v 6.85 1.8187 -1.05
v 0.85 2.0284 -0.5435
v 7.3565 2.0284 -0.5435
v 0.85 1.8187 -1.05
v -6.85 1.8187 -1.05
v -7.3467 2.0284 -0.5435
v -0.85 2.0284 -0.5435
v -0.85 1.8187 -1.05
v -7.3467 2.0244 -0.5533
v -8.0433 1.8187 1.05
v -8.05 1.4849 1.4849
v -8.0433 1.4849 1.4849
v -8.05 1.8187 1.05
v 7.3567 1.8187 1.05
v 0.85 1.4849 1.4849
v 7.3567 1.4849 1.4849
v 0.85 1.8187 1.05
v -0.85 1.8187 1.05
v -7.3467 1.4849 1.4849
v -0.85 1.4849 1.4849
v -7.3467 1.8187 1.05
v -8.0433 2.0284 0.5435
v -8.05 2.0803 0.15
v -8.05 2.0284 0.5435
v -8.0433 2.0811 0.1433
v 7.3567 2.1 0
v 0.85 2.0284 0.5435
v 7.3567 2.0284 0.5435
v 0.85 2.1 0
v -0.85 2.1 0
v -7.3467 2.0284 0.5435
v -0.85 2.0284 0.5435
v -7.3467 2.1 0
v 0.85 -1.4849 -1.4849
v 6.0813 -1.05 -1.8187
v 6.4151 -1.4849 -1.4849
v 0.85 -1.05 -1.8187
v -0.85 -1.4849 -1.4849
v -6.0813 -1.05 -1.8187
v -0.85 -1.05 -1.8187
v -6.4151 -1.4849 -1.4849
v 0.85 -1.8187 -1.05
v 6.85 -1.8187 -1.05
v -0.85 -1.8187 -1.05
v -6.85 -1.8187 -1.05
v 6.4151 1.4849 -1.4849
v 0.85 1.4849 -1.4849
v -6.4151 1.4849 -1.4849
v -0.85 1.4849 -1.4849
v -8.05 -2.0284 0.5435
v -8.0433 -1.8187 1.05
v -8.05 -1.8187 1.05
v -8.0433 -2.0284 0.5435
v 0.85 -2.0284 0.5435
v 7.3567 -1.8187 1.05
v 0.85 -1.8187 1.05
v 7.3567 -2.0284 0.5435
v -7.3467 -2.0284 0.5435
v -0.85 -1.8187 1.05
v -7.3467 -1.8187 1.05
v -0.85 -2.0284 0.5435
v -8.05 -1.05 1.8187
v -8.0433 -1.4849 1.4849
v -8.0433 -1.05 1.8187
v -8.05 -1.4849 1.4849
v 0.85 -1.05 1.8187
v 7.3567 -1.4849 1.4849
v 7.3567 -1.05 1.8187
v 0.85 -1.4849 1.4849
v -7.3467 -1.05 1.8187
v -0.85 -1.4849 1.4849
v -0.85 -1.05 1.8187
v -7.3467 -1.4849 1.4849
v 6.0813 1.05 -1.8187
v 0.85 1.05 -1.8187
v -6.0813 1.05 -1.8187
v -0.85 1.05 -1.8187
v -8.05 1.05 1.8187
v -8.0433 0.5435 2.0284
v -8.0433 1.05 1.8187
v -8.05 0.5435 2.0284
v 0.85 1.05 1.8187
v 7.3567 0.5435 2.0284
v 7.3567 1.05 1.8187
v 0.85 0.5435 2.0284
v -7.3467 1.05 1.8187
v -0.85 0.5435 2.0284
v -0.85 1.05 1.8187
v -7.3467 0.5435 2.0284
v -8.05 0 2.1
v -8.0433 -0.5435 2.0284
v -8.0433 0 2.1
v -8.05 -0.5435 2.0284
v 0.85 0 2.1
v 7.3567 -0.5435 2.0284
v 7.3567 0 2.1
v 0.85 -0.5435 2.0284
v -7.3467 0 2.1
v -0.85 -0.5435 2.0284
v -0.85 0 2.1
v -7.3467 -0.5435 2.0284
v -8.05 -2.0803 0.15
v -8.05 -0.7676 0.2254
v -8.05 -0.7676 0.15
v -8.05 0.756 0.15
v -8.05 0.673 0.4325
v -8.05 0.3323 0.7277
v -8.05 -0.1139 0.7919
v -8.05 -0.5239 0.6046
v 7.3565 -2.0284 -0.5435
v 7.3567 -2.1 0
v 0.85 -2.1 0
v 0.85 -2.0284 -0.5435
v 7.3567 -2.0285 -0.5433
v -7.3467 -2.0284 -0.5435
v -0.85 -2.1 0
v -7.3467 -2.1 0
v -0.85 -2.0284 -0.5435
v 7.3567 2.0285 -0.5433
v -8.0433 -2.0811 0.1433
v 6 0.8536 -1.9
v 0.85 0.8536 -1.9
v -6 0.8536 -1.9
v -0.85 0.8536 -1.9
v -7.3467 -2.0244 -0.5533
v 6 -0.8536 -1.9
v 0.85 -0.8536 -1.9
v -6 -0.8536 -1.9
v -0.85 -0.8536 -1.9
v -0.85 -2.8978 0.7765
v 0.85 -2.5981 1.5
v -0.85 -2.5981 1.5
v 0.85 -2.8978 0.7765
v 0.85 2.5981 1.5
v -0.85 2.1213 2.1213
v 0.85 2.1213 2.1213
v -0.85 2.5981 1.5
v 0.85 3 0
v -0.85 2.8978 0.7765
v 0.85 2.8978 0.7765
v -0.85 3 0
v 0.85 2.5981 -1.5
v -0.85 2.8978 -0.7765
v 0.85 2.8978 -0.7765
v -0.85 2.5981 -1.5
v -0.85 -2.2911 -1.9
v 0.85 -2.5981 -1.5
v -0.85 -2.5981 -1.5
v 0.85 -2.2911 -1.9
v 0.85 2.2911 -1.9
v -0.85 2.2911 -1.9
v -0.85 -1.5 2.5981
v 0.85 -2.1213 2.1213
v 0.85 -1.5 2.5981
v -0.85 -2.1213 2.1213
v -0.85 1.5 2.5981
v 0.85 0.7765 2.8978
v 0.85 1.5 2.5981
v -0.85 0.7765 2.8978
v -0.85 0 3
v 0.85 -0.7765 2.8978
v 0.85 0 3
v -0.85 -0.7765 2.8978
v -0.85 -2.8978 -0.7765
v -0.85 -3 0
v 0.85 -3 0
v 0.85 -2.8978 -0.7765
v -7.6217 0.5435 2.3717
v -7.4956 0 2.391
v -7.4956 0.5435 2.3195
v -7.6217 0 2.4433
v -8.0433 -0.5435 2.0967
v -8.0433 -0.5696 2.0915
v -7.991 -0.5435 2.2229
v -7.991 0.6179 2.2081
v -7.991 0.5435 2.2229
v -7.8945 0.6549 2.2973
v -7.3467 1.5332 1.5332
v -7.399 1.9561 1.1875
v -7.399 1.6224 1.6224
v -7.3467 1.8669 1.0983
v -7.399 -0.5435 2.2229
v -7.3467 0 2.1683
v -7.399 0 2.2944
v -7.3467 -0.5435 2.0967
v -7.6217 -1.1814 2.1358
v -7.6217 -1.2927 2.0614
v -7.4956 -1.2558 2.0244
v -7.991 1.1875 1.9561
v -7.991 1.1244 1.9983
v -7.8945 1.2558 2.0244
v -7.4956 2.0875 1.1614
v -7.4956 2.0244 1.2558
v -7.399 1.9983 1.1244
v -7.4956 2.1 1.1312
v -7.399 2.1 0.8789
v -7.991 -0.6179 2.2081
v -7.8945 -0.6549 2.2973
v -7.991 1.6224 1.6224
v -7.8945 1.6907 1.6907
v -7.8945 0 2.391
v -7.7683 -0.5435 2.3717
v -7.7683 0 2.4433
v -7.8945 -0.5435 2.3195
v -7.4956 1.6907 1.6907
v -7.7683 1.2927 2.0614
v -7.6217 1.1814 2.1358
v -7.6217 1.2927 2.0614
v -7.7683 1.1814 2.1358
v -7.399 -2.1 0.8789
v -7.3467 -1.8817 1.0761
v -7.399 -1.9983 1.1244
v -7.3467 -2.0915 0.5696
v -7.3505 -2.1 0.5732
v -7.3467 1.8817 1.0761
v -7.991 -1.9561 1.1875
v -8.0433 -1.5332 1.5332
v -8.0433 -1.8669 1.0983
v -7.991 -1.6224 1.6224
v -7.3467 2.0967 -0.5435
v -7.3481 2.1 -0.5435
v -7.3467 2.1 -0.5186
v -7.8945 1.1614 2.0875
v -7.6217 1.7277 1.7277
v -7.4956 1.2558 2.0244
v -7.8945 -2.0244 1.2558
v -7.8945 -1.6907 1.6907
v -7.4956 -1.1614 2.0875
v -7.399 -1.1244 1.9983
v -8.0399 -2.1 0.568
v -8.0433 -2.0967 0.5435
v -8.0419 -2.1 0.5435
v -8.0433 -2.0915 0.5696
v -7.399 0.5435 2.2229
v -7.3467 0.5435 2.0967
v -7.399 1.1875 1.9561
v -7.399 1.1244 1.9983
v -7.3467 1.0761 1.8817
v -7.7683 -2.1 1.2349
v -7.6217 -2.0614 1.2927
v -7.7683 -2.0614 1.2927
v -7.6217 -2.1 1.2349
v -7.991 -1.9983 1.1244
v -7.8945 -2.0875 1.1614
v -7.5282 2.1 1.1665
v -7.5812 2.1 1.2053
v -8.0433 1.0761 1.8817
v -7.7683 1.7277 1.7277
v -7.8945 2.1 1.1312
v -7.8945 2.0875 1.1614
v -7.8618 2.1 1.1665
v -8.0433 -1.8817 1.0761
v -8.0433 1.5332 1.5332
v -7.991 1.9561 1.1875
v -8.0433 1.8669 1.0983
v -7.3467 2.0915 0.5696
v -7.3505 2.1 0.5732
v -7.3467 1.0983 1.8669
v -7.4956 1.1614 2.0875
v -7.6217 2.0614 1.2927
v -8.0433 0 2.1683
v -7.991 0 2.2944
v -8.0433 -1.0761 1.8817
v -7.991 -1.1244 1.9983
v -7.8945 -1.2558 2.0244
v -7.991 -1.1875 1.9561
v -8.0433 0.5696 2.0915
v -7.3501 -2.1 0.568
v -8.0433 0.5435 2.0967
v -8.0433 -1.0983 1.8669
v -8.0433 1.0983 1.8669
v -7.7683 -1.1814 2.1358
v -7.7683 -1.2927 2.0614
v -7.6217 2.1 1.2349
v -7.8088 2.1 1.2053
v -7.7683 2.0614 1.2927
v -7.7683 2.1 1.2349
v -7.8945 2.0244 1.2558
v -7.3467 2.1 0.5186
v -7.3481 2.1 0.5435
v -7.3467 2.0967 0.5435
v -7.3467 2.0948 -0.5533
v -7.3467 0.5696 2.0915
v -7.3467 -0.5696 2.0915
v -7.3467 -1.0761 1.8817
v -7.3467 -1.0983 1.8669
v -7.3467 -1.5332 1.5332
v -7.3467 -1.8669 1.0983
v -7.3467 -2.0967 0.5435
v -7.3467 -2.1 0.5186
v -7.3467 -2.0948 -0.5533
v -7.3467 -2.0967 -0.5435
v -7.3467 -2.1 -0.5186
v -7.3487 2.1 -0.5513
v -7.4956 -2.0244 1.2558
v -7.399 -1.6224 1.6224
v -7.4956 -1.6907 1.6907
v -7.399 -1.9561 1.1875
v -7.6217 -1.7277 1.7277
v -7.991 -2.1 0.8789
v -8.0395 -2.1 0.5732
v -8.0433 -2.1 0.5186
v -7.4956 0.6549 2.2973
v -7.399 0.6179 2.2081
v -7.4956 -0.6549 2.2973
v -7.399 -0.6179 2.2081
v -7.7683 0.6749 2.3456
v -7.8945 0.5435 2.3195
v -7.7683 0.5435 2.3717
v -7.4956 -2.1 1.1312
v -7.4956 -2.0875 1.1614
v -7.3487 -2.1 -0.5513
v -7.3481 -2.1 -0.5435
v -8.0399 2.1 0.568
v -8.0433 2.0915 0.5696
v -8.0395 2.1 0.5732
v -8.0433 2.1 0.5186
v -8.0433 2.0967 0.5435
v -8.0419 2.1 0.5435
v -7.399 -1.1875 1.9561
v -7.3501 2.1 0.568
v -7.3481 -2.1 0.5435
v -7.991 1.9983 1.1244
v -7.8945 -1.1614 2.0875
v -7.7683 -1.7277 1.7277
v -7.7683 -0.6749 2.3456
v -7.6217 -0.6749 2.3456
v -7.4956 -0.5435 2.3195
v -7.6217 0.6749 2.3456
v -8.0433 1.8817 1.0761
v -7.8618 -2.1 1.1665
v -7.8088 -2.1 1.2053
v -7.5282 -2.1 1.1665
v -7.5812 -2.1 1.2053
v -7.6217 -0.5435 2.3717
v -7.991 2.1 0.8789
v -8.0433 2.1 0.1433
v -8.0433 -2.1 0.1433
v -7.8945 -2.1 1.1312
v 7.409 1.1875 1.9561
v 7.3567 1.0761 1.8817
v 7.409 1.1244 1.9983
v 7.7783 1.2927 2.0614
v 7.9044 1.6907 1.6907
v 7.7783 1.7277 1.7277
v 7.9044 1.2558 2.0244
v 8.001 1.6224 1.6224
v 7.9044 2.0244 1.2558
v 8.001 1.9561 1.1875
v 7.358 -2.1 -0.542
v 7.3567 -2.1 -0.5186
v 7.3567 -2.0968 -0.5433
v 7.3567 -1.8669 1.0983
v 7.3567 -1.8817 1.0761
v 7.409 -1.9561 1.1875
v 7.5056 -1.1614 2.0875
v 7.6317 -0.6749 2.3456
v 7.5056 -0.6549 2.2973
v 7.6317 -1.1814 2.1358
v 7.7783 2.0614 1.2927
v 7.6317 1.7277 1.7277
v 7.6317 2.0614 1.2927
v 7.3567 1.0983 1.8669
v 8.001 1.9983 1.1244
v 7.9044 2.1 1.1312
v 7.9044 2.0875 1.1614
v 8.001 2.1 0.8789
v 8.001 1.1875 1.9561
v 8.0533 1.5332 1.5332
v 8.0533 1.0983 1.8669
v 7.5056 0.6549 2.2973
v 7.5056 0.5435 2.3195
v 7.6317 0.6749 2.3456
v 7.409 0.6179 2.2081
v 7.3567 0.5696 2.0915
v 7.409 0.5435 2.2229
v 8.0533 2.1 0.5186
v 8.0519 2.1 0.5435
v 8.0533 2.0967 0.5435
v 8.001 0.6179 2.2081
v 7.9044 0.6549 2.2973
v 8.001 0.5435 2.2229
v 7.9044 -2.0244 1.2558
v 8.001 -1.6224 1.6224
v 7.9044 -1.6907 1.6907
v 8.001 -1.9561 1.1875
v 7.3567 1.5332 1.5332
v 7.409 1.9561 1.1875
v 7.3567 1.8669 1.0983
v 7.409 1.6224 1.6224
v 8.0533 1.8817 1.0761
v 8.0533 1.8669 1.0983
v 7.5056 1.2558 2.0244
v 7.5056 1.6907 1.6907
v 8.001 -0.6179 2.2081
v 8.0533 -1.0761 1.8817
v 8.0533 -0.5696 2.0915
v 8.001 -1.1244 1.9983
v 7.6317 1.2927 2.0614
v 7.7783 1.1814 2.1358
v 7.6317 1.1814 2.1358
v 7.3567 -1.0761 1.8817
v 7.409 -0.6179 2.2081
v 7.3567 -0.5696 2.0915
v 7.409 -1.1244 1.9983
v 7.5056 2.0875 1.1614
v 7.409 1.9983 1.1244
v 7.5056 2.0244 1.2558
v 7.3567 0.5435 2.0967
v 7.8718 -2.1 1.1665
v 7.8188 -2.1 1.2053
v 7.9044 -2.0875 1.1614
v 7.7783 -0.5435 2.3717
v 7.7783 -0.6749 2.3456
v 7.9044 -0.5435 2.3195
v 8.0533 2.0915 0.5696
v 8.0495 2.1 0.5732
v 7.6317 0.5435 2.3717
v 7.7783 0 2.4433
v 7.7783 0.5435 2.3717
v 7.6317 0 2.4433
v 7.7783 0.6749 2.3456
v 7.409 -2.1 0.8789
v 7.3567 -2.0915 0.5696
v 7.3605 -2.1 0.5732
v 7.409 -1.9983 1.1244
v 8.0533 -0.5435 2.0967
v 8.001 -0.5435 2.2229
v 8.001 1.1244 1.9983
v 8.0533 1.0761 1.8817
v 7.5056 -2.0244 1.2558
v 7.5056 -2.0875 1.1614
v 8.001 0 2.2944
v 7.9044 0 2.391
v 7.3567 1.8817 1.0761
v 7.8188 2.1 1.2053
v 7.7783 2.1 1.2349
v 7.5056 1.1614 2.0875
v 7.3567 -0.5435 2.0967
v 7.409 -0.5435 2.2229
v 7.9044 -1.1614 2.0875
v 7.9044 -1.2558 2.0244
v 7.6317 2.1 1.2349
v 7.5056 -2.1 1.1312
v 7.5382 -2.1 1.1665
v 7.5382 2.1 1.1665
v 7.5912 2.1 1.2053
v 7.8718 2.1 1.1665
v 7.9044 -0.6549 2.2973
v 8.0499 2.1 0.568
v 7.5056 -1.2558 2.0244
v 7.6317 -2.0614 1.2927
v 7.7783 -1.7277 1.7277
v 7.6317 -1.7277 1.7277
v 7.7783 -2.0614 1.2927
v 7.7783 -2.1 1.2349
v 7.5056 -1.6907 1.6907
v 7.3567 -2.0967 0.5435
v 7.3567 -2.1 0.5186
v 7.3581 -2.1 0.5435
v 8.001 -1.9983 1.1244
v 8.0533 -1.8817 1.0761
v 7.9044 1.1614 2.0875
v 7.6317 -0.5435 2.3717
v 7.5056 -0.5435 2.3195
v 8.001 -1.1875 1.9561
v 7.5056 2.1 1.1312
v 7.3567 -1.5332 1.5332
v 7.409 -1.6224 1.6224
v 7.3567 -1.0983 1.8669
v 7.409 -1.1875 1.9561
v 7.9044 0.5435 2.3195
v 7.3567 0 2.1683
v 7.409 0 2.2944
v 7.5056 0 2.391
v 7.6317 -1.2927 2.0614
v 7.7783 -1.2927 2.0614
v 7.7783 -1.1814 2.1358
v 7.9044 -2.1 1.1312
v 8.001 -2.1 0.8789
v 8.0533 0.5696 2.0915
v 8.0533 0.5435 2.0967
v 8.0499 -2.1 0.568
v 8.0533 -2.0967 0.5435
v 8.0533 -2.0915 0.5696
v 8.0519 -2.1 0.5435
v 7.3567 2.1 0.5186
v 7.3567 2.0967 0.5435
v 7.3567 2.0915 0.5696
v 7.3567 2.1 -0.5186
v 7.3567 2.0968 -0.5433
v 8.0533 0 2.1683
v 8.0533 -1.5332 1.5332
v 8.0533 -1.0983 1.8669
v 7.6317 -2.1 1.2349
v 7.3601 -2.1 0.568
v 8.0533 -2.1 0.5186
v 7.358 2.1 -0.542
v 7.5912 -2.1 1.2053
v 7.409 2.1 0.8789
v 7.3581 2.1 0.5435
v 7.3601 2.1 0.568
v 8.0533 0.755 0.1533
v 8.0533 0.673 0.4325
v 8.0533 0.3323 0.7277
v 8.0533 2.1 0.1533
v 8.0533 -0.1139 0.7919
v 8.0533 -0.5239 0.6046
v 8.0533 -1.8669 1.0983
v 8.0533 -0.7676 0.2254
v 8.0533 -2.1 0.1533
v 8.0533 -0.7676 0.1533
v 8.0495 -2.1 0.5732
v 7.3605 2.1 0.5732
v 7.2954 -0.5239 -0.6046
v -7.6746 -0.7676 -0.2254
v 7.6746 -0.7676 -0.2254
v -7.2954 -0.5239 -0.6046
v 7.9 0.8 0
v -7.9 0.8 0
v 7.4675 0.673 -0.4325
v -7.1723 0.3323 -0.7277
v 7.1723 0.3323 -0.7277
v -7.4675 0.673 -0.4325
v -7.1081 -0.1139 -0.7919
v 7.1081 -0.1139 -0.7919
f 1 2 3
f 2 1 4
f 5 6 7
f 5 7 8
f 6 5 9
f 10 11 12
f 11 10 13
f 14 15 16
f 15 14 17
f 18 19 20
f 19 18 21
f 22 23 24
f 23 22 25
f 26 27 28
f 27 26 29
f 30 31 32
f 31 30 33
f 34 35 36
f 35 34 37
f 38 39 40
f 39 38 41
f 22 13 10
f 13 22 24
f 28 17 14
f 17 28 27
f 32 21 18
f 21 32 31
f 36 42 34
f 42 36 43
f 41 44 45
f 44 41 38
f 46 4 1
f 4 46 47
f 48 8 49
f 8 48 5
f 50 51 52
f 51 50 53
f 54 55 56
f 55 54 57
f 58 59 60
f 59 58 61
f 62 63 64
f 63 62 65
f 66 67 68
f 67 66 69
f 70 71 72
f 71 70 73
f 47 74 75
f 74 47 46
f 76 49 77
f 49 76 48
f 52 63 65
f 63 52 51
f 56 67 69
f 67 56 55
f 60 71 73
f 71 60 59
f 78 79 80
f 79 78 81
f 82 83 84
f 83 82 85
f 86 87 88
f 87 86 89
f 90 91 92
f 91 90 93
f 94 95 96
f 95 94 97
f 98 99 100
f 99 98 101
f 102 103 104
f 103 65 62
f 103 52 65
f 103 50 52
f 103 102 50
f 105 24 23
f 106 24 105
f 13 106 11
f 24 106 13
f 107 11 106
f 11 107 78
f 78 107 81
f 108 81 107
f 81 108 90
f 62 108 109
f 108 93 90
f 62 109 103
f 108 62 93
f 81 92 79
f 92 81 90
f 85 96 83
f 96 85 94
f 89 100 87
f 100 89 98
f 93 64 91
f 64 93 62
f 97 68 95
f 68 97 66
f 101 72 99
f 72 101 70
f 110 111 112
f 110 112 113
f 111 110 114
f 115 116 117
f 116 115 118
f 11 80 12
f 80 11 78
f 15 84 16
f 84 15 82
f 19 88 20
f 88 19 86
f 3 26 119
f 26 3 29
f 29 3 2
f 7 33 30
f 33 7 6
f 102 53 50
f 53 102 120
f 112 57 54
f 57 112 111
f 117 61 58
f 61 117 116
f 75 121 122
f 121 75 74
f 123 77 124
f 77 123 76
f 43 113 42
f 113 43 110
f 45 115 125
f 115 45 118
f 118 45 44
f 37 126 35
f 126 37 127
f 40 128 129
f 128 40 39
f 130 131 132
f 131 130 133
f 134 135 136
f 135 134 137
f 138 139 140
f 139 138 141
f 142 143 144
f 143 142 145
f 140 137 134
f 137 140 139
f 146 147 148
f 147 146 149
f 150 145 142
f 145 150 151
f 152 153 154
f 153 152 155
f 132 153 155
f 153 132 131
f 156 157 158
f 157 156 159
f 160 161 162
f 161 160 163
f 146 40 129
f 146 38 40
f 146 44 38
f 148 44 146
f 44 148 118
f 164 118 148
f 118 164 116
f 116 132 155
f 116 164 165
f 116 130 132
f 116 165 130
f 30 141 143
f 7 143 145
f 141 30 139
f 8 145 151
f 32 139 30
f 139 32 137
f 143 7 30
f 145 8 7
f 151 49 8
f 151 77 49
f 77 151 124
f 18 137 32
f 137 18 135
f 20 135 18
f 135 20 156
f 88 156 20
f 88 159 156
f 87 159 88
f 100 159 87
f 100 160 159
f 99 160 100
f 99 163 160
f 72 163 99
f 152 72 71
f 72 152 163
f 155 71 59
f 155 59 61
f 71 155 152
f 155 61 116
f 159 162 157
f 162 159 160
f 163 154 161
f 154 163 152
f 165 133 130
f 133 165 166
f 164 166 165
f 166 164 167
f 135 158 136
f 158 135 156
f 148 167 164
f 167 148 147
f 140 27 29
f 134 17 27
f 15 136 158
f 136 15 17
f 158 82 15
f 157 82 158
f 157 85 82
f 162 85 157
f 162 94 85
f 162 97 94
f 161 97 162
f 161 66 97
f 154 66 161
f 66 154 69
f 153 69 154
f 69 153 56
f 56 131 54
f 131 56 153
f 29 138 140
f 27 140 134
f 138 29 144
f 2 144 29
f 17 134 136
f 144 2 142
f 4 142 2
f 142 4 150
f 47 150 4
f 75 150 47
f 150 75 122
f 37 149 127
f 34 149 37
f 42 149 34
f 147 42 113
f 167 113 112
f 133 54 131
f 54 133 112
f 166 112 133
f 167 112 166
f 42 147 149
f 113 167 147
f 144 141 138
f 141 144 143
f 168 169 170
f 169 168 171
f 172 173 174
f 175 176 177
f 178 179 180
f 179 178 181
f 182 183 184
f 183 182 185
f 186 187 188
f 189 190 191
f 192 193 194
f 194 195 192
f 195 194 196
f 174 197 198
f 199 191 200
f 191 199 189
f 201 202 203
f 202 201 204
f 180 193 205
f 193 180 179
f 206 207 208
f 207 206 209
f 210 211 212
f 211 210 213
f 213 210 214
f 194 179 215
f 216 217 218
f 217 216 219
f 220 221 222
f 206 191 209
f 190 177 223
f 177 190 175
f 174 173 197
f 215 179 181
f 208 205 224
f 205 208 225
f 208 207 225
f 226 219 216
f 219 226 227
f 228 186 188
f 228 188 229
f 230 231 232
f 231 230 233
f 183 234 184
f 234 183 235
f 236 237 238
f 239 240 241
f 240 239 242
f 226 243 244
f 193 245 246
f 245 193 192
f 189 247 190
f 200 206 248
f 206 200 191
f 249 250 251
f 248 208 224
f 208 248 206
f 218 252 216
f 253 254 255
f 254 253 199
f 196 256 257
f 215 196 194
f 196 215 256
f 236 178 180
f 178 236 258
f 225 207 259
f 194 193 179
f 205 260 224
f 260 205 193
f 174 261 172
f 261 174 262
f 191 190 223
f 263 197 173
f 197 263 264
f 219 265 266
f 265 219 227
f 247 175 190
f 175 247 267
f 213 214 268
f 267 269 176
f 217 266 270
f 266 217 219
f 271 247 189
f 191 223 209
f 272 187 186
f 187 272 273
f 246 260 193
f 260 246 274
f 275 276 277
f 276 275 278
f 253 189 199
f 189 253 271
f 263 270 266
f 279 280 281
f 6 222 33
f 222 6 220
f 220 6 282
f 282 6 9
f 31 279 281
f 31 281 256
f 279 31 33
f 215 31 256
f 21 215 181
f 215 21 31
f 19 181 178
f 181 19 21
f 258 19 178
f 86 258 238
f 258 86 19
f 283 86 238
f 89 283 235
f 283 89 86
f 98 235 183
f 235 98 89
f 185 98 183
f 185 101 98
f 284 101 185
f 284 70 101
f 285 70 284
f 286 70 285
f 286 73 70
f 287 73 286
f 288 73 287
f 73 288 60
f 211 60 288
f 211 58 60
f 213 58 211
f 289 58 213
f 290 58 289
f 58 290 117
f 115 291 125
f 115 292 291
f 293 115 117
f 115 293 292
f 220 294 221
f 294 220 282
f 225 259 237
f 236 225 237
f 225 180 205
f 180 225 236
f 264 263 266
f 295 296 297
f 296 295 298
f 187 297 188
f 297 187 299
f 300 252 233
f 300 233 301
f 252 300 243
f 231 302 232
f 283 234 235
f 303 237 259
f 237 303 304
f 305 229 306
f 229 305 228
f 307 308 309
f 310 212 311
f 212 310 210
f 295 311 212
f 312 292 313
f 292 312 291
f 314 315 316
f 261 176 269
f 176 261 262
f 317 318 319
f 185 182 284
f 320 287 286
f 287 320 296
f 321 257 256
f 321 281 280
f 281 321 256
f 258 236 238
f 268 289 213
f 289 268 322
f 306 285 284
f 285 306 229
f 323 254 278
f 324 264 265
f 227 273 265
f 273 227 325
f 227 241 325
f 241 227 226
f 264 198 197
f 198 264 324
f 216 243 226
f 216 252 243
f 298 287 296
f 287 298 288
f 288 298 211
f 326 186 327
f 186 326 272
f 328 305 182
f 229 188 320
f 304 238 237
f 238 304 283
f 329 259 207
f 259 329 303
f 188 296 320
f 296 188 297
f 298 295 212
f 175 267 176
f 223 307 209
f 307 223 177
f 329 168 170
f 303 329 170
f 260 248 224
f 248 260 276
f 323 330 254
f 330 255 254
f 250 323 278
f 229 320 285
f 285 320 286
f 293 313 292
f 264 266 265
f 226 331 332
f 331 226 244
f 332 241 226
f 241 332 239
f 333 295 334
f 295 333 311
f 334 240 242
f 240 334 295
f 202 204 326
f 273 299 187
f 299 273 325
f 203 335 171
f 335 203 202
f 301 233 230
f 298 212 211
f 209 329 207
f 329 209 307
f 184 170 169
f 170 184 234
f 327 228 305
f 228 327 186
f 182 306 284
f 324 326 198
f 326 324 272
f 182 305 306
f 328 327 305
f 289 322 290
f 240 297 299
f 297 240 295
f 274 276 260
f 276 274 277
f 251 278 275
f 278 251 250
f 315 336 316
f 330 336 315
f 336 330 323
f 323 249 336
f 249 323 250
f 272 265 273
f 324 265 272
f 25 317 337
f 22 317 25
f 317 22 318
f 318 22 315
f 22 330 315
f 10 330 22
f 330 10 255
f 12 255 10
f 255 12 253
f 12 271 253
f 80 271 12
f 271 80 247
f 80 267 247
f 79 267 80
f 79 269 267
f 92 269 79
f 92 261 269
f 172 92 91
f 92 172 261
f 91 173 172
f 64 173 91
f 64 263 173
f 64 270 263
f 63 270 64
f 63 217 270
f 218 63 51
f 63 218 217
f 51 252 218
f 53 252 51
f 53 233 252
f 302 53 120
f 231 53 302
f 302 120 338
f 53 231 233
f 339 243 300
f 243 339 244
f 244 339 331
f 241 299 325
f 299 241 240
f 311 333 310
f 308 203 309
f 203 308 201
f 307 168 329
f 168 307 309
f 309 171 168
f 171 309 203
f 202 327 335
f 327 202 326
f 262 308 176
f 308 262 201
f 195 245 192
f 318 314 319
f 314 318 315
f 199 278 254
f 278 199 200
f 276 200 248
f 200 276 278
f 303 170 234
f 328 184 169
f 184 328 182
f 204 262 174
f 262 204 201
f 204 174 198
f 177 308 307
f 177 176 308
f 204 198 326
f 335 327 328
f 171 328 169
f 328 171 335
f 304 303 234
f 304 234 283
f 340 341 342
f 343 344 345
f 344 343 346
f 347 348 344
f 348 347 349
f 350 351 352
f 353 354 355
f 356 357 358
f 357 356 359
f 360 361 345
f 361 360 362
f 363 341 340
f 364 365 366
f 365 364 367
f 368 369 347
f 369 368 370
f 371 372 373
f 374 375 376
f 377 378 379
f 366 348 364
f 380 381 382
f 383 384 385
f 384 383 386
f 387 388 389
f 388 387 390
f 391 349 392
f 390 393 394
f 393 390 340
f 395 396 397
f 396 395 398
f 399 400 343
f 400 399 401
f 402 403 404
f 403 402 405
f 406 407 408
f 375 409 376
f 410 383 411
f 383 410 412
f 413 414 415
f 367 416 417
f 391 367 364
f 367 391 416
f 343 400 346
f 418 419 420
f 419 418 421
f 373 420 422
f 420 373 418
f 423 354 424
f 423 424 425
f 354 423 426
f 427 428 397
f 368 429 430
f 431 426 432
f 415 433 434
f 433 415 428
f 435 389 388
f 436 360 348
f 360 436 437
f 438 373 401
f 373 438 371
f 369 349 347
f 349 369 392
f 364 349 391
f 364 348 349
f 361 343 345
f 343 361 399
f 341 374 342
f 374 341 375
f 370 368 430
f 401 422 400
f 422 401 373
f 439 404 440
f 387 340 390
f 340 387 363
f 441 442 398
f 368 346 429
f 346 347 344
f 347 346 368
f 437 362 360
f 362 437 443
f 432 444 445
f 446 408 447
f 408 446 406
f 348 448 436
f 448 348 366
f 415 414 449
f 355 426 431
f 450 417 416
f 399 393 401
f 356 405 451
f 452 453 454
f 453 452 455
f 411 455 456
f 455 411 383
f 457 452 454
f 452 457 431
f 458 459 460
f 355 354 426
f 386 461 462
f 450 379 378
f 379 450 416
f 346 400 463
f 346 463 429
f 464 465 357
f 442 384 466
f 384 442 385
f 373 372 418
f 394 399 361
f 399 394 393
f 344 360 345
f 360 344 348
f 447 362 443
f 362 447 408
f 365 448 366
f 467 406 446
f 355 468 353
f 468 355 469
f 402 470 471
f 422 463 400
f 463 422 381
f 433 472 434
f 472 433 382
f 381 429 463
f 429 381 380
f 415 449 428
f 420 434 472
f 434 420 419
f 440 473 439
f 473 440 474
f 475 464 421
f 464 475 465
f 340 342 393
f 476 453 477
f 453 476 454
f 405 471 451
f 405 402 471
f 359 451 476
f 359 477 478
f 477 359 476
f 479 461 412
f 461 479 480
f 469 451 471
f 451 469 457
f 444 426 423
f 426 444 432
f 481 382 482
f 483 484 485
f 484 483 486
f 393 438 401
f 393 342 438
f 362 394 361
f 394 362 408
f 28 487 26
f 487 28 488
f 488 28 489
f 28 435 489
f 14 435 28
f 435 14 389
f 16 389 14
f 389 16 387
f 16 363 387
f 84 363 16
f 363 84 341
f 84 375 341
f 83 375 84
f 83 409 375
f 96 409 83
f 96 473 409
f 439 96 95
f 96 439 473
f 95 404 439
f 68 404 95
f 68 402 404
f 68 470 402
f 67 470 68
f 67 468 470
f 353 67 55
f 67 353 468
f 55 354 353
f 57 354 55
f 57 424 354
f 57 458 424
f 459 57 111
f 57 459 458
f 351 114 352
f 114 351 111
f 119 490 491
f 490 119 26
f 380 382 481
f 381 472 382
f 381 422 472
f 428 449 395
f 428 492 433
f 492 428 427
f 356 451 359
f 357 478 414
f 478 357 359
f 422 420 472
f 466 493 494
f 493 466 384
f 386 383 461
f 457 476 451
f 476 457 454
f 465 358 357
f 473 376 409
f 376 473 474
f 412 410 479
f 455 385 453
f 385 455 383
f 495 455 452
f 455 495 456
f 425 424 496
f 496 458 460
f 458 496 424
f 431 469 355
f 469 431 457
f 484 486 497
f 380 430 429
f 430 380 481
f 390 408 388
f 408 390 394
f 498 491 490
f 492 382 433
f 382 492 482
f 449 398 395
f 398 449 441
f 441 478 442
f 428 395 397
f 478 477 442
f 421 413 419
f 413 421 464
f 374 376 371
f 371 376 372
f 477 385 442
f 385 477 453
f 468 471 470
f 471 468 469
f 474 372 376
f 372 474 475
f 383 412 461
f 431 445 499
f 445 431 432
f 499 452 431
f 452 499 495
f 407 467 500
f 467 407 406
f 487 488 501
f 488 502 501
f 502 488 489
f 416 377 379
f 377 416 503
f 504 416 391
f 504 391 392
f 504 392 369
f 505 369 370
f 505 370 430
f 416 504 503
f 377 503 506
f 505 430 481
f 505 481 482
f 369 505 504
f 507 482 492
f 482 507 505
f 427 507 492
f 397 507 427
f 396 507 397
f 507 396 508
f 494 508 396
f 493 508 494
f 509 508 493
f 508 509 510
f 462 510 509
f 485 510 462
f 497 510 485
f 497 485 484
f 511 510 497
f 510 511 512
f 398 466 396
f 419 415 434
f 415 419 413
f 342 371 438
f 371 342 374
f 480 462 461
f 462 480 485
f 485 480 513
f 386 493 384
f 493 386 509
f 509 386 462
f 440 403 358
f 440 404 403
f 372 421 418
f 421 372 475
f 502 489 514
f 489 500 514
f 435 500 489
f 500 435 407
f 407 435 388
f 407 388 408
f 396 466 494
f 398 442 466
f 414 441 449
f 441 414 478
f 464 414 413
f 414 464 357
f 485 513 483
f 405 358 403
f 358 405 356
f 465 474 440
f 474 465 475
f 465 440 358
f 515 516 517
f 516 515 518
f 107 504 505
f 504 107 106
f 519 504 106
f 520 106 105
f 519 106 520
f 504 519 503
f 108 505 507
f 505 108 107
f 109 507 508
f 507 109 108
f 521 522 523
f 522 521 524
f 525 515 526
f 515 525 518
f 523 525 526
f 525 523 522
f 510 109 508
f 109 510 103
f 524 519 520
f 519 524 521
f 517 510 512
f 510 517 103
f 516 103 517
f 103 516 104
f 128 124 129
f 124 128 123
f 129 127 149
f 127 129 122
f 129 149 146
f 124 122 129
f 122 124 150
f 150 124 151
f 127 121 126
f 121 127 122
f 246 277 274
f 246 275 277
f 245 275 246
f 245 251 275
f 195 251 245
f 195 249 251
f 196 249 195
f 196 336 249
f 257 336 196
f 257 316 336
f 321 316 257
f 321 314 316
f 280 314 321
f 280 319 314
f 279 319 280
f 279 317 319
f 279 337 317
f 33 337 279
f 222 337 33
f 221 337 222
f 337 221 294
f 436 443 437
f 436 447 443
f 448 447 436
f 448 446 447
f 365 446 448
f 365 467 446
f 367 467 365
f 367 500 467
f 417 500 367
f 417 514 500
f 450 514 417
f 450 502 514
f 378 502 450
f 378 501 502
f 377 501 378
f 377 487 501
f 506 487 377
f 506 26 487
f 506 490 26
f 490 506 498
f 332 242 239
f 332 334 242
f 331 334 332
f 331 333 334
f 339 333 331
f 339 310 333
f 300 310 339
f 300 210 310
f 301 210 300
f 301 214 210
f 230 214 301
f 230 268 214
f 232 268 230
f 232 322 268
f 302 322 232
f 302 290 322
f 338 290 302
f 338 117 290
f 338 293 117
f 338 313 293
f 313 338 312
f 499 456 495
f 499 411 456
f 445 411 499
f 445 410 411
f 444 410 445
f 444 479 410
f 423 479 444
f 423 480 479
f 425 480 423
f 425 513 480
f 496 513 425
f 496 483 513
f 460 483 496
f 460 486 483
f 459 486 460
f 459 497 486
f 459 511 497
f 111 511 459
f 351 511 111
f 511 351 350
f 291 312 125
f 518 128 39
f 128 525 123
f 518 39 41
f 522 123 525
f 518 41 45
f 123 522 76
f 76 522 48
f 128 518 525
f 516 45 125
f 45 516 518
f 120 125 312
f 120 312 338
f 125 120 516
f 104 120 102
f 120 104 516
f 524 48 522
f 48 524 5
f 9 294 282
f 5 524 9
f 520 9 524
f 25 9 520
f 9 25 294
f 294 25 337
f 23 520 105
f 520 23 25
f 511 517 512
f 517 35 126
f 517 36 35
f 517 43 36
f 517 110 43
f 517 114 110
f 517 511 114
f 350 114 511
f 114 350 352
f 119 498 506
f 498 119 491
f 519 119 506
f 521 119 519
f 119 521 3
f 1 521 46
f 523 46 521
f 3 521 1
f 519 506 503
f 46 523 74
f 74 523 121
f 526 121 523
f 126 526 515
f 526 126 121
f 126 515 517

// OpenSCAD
// file: ../style.scad
/*
PELA Parametric Block Style

Alter the baseline style of all designs. Many designs will locally override some but not all of these parameters.

Published at https://PELAblocks.org

By Paul Houghton
Twitter: @mobile_rat
Email: paulirotta@gmail.com
Blog: https://medium.com/@paulhoughton

Creative Commons Attribution-ShareAlike 4.0 International License
    https://creativecommons.org/licenses/by-sa/4.0/legalcode

Open source design, Powered By Futurice. Come work with the best.
    https://www.futurice.com/

Import this into other design files to set baseline constants:
    include <style.scad>

If the nozzle you normally use on your printer is 0.5mm or less, edit line 31 to read:
    31:     large_nozzle = false; // [true:nozzle >= 0.5mm, false:nozzle < 0.5mm]

There are many other parameters here which affect all generated PELA models. Any changes you make here affect all models unless that parameter is locally updated in a given model. Where models duplicate these settings, the local value will appear in the "Customizer" view of OpenSCAD. Think of those local overrides of these default style settings as a design decision: changing that parameter for that particular model is likely to be useful to you.

*/

include <material.scad>


/* [Block] */

// Presence of bottom connector sockets
_sockets = true;

// Presence of top connector knobs
_knobs = true;

// Place holes in the corners for mountings screws (0=>no holes, 1=>holes)
_corner_bolt_holes = false;

// Size of corner holes for M3 mountings bolts
_bolt_hole_radius = 1.6; // [0.0:0.1:3.0]

// Add interior fill for the base layer
_solid_first_layer = false;

// Add interior fill for upper layers
_solid_upper_layers = true;


/* [Knob] */

// Knob top surface strength
_knob_top_thickness = 1.0;

// Height of traditional connectors [mm] (taller gives a stronger hold)
_knob_height = 2.9; // [0:disabled, 1.8:traditional, 2.9:PELA 3D print tall]

// Size of a hole in the top of each knob. Set 0 to disable for best flexture or enable for air circulation/aesthetics/drain resin
_knob_vent_radius = 0.0; // [0.0:0.1:4]

// Ease insertion by slightly widening the socket entry
_bevel_socket = true;

// Height of a small bottom knob insert easement, flaring the bottom edges to make assembly easier
_socket_insert_bevel = 0.1;




/* [Technic] */

// Technic connector hole
//axle_hole_radius = 2.45 + axle_hole_tweak;

// Add full width through holes spaced along the length for techic connectors
_side_holes = 3; // [0:disabled, 1:short air vents, 2:short connectors, 3:full width connectors]

// Add a wrapper around side holes (disable for extra ventilation but loose lock notches)
_side_sheaths = true;

// Add short end holes spaced along the width for techic connectors
_end_holes = 2; // [0:disabled, 1:short air vents, 2:short connectors, 3:full length connectors]

// Add a wrapper around end holes (disable for extra ventilation but loose lock notches)
_end_sheaths = true;

// Add holes in the top deck to improve airflow and reduce weight
_top_vents = false;


/* [Shell] */

// Thickness of the solid top surface of the block
_top_shell = 1;


/* [Advanced Block] */

// Basic unit vertical size of each block
_block_height = 8; // [8:technic, 9.6:traditional knobs]

// Horizontal clearance space removed from the outer horizontal surface to allow two parts to be placed next to one another on a 8mm grid [mm]
_skin = 0.1; // [0:0.02:0.5]

// Height of the hole beneath each knob which facilitates click lock in low-flex materials by variable side pressure on any block above
_knob_flexture_height = 4.5;

// Width of horizontal surface strengthening slats between the bottom rings
_bottom_stiffener_width = 2.6;

// Height of horizontal surface strengthening slats (appears between the bottom rings, default is material.scad:knob_height)
_bottom_stiffener_height = _knob_height;


/* [Advanced Technic] */

// Technic connector hole inset radius
_counterbore_inset_radius = 3.1; // [0.1:0.1:4]

// Technic connector hole inset depth
_counterbore_inset_depth = 0.95; // [0.1:0.1:4]

// Contact length of axle to block (not including inset length and end snap fit flexture in peg connectors)
_peg_length = 6.5; // [0.1:0.1:16]

// Size of the cylinder wrapped around the technic holes
_bearing_sheath_thickness = 0.9; // [0.1:0.1:4]


/* [Block Aesthetics] */

// Width of a line etched in the side of multi-layer block sets (0 to disable)
_ridge_width = 0.15; // [0.1:0.05:4]

// Depth of a line etched in the side of multi-layer block sets
_ridge_depth = 0.3; // [0.1:0.05:4]


/* [Baked Print Supports] */

// Generate print-time support aid structures for models which offer this. Turn this off if you will use slicer-generated print supports, but be aware that these may make the bottom connectors difficult to post process.
_print_supports = true;

// Space between support/support.scad and the part)
_support_offset_from_part = 0.1; // [0.0:0.01:1]

// Thickness of each rotating layer in a twisting support [mm]
_support_layer_height = 2; // [0.1:0.1:8]

// Thickness of a base panel for holding supports together [mm]
_support_connection_height = 0.5; // [0.1:0.1:8]

// Length of sides of a support equilateral triangle [mm]
_support_side_length = 4; // [0.1:0.1:16]

// Per layer support rotation for strength [degrees]
_support_layer_rotation = 6; // [1:179]

// Reverse direction of support rotation periodically to constrain size [degrees] (0 to disable)
_support_max_rotation = 0; // [0:360]


/* [Hidden] */

// Basic unit horizontal size of each block
_block_width = 8; // [8:technic and traditional blocks]

// Height of the connectors commercial blocks use [mm]
_official_knob_height = 1.8; // [1.8:traditional blocks]

// Slight visual offset to work around prevent goldfeather rendering bugs in OpenSCAD (visual, not affecting final print geometry) [mm]
_defeather = 0.01;

// Roundness of bottom connector rings (Use 8 for octagonal sockets- many parts of the geomoetry must be adjusted if you change this)
_ring_fn=8;

// Roundness of bottom connector rings (Use 8 for octagonal sockets- many parts of the geomoetry must be adjusted if you change this)
_axle_hole_fn=32;

// Minimum angle to approximate a circle
$fa = 15;

// Minimum segment length to approximate a circle
$fs = 0.5;


/////////////////////////////////////
// FUNCTIONS
/////////////////////////////////////

// Horizontal size
function block_width(i=1) = i*_block_width;

// Vertical size [mm]
function block_height(h=1, block_height) = h*block_height;

// Test if this is a corner block
function is_corner(x, y, l, w) = (x==0 || x==l-1) && (y==0 || y==w-1);

// Ratio of a flat panel thickness to a regular block thickness (1/2 for PELA 8mm tall blocks, 1/3 for LEGO 9.6mm block_height blocks)
function panel_height_ratio(block_height) = block_height < 9.6 ? 1/2 : 1/3;

// Thickness of a flat panel [mm]
function panel_height(block_height) = block_height(1, block_height=_block_height)*panel_height_ratio(block_height=_block_height);

// Bottom connector additional distance from outside lock and connector rings which small flexture-fit rims protrude inwards to grab the base of knobs for asymmetric side pressure to assist with snap fit [mm]
function side_lock_thickness(material) = is_flexible(_material) ? 0.06 : 0.02;

// Horizontal width of each side of a support triangle [mm]
function support_line_width(large_nozzle) = large_nozzle ? 0.7 : 0.5;

// Force the cut visual line for seeing inside parts to be between 0 and 1mm short of the part width [mm]
function visual_cut(cut_line, w) = max(min(cut_line, block_width(w)), 0);

// Thickness of the solid outside surface of the block [mm]
function side_shell(large_nozzle) = large_nozzle ? 1.2 : 1.0;
// main file
/*
PELA Parametric LEGO-compatible Technic Connector Peg

PELA Parametric Blocks - 3D Printed LEGO-compatible parametric blocks

Published at https://PELAblocks.org

By Paul Houghton
Twitter: @mobile_rat
Email: paulirotta@gmail.com
Blog: https://medium.com/@paulhoughton

Creative Commons Attribution-ShareAlike 4.0 International License
    https://creativecommons.org/licenses/by-sa/4.0/legalcode

Open source design, Powered By Futurice. Come work with the best.
    https://www.futurice.com/
*/

include <../style.scad>
include <../material.scad>
use <../PELA-block.scad>
use <PELA-technic-peg.scad>

/* [Technic Simplified Peg] */

// Show the inside structure [mm]
_cut_line = 0; // [0:1:100]

// Printing material (set to select calibrated knob, socket and axle hole fit)
_material = 0; // [0:PLA, 1:ABS, 2:PET, 3:Biofila Silk, 4:Pro1, 5:NGEN, 6:NGEN FLEX, 7:Bridge Nylon, 8:TPU95, 9:TPU85/NinjaFlex, 10:Polycarbonite]
// Is the printer nozzle >= 0.5mm? If so, some features are enlarged to make printing easier
_large_nozzle = true;

// An axle which fits loosely in a technic bearing hole
_axle_radius = 2.1; // [0.1:0.1:4]

// Size of the hollow inside a pin
_peg_center_radius=0.8; // [0.1:0.1:4]

// Size of the connector lock-in bump at the ends of a Pin
_peg_tip_length = 0.7; // [0.1:0.1:4]

// Width of the long vertical flexture slots in the side of a pin
_peg_slot_thickness = 0.0; // [0.1:0.1:4]


/* [Simplified Peg] */

// Size of the flat bottom cut to make the pin more easily printable
_bottom_flatness = 0.2; // [0.0:0.1:5]

// Size of the end angle cuts to ease tip flex
_end_cut_length = 6; // [0.0:0.1:10]





///////////////////////////////
// DISPLAY
///////////////////////////////

simplified_peg(material=_material, large_nozzle=_large_nozzle, cut_line=_cut_line, axle_radius=_axle_radius, peg_center_radius=_peg_center_radius, peg_length=_peg_length, peg_tip_length=_peg_tip_length, peg_slot_thickness=_peg_slot_thickness, bottom_flatness=_bottom_flatness, end_cut_length=_end_cut_length);



//////////////////
// Functions
//////////////////

module simplified_peg(material, large_nozzle, cut_line, axle_radius, peg_center_radius, peg_length, peg_tip_length, peg_slot_thickness, bottom_flatness, end_cut_length) {

    assert(material!=undef);
    assert(large_nozzle!=undef);
    assert(cut_line!=undef);
    assert(axle_radius!=undef);
    assert(peg_center_radius!=undef);
    assert(peg_length!=undef);
    assert(peg_tip_length!=undef);
    assert(peg_slot_thickness!=undef);
    assert(bottom_flatness!=undef);
    assert(end_cut_length!=undef);

    translate([0, 0, -axle_radius+bottom_flatness]) {
        intersection() {
            translate([0, 0, axle_radius - bottom_flatness]) {
                rotate([0, 90, 0]) {
                    peg(material=material, large_nozzle=large_nozzle, cut_line=cut_line, axle_radius=axle_radius, peg_center_radius=peg_center_radius, peg_length=peg_length, peg_tip_length=peg_tip_length, peg_slot_thickness=peg_slot_thickness);
                }
            }
            
            simplified_peg_cut(material=material, peg_length=peg_length, end_cut_length=end_cut_length, axle_radius=axle_radius);
        }
    }
}


module simplified_peg_cut(material, peg_length, end_cut_length, axle_radius) {
    difference() {
        union() {
            width = is_flexible(material) ? 100 : axle_radius;

            translate([-100, -width, 0]) {
                cube([200, 2*width, 100]);
            }

            translate([-peg_length/2, -100, 0]) {
                cube([peg_length, 200, 100]);
            }
        }

        echo(material);

        if (!is_flexible(material)) {
            union() {
                translate([-end_cut_length, -10, 0]) {
                    rotate([0, -135, 0]) {
                        cube([20, 20, 20]);
                    }
                }
                    
                translate([end_cut_length, -10, 0]) {
                    rotate([0, 45, 0]) {
                        cube([20, 20, 20]);
                    }
                }
            }
        }
    }
}
